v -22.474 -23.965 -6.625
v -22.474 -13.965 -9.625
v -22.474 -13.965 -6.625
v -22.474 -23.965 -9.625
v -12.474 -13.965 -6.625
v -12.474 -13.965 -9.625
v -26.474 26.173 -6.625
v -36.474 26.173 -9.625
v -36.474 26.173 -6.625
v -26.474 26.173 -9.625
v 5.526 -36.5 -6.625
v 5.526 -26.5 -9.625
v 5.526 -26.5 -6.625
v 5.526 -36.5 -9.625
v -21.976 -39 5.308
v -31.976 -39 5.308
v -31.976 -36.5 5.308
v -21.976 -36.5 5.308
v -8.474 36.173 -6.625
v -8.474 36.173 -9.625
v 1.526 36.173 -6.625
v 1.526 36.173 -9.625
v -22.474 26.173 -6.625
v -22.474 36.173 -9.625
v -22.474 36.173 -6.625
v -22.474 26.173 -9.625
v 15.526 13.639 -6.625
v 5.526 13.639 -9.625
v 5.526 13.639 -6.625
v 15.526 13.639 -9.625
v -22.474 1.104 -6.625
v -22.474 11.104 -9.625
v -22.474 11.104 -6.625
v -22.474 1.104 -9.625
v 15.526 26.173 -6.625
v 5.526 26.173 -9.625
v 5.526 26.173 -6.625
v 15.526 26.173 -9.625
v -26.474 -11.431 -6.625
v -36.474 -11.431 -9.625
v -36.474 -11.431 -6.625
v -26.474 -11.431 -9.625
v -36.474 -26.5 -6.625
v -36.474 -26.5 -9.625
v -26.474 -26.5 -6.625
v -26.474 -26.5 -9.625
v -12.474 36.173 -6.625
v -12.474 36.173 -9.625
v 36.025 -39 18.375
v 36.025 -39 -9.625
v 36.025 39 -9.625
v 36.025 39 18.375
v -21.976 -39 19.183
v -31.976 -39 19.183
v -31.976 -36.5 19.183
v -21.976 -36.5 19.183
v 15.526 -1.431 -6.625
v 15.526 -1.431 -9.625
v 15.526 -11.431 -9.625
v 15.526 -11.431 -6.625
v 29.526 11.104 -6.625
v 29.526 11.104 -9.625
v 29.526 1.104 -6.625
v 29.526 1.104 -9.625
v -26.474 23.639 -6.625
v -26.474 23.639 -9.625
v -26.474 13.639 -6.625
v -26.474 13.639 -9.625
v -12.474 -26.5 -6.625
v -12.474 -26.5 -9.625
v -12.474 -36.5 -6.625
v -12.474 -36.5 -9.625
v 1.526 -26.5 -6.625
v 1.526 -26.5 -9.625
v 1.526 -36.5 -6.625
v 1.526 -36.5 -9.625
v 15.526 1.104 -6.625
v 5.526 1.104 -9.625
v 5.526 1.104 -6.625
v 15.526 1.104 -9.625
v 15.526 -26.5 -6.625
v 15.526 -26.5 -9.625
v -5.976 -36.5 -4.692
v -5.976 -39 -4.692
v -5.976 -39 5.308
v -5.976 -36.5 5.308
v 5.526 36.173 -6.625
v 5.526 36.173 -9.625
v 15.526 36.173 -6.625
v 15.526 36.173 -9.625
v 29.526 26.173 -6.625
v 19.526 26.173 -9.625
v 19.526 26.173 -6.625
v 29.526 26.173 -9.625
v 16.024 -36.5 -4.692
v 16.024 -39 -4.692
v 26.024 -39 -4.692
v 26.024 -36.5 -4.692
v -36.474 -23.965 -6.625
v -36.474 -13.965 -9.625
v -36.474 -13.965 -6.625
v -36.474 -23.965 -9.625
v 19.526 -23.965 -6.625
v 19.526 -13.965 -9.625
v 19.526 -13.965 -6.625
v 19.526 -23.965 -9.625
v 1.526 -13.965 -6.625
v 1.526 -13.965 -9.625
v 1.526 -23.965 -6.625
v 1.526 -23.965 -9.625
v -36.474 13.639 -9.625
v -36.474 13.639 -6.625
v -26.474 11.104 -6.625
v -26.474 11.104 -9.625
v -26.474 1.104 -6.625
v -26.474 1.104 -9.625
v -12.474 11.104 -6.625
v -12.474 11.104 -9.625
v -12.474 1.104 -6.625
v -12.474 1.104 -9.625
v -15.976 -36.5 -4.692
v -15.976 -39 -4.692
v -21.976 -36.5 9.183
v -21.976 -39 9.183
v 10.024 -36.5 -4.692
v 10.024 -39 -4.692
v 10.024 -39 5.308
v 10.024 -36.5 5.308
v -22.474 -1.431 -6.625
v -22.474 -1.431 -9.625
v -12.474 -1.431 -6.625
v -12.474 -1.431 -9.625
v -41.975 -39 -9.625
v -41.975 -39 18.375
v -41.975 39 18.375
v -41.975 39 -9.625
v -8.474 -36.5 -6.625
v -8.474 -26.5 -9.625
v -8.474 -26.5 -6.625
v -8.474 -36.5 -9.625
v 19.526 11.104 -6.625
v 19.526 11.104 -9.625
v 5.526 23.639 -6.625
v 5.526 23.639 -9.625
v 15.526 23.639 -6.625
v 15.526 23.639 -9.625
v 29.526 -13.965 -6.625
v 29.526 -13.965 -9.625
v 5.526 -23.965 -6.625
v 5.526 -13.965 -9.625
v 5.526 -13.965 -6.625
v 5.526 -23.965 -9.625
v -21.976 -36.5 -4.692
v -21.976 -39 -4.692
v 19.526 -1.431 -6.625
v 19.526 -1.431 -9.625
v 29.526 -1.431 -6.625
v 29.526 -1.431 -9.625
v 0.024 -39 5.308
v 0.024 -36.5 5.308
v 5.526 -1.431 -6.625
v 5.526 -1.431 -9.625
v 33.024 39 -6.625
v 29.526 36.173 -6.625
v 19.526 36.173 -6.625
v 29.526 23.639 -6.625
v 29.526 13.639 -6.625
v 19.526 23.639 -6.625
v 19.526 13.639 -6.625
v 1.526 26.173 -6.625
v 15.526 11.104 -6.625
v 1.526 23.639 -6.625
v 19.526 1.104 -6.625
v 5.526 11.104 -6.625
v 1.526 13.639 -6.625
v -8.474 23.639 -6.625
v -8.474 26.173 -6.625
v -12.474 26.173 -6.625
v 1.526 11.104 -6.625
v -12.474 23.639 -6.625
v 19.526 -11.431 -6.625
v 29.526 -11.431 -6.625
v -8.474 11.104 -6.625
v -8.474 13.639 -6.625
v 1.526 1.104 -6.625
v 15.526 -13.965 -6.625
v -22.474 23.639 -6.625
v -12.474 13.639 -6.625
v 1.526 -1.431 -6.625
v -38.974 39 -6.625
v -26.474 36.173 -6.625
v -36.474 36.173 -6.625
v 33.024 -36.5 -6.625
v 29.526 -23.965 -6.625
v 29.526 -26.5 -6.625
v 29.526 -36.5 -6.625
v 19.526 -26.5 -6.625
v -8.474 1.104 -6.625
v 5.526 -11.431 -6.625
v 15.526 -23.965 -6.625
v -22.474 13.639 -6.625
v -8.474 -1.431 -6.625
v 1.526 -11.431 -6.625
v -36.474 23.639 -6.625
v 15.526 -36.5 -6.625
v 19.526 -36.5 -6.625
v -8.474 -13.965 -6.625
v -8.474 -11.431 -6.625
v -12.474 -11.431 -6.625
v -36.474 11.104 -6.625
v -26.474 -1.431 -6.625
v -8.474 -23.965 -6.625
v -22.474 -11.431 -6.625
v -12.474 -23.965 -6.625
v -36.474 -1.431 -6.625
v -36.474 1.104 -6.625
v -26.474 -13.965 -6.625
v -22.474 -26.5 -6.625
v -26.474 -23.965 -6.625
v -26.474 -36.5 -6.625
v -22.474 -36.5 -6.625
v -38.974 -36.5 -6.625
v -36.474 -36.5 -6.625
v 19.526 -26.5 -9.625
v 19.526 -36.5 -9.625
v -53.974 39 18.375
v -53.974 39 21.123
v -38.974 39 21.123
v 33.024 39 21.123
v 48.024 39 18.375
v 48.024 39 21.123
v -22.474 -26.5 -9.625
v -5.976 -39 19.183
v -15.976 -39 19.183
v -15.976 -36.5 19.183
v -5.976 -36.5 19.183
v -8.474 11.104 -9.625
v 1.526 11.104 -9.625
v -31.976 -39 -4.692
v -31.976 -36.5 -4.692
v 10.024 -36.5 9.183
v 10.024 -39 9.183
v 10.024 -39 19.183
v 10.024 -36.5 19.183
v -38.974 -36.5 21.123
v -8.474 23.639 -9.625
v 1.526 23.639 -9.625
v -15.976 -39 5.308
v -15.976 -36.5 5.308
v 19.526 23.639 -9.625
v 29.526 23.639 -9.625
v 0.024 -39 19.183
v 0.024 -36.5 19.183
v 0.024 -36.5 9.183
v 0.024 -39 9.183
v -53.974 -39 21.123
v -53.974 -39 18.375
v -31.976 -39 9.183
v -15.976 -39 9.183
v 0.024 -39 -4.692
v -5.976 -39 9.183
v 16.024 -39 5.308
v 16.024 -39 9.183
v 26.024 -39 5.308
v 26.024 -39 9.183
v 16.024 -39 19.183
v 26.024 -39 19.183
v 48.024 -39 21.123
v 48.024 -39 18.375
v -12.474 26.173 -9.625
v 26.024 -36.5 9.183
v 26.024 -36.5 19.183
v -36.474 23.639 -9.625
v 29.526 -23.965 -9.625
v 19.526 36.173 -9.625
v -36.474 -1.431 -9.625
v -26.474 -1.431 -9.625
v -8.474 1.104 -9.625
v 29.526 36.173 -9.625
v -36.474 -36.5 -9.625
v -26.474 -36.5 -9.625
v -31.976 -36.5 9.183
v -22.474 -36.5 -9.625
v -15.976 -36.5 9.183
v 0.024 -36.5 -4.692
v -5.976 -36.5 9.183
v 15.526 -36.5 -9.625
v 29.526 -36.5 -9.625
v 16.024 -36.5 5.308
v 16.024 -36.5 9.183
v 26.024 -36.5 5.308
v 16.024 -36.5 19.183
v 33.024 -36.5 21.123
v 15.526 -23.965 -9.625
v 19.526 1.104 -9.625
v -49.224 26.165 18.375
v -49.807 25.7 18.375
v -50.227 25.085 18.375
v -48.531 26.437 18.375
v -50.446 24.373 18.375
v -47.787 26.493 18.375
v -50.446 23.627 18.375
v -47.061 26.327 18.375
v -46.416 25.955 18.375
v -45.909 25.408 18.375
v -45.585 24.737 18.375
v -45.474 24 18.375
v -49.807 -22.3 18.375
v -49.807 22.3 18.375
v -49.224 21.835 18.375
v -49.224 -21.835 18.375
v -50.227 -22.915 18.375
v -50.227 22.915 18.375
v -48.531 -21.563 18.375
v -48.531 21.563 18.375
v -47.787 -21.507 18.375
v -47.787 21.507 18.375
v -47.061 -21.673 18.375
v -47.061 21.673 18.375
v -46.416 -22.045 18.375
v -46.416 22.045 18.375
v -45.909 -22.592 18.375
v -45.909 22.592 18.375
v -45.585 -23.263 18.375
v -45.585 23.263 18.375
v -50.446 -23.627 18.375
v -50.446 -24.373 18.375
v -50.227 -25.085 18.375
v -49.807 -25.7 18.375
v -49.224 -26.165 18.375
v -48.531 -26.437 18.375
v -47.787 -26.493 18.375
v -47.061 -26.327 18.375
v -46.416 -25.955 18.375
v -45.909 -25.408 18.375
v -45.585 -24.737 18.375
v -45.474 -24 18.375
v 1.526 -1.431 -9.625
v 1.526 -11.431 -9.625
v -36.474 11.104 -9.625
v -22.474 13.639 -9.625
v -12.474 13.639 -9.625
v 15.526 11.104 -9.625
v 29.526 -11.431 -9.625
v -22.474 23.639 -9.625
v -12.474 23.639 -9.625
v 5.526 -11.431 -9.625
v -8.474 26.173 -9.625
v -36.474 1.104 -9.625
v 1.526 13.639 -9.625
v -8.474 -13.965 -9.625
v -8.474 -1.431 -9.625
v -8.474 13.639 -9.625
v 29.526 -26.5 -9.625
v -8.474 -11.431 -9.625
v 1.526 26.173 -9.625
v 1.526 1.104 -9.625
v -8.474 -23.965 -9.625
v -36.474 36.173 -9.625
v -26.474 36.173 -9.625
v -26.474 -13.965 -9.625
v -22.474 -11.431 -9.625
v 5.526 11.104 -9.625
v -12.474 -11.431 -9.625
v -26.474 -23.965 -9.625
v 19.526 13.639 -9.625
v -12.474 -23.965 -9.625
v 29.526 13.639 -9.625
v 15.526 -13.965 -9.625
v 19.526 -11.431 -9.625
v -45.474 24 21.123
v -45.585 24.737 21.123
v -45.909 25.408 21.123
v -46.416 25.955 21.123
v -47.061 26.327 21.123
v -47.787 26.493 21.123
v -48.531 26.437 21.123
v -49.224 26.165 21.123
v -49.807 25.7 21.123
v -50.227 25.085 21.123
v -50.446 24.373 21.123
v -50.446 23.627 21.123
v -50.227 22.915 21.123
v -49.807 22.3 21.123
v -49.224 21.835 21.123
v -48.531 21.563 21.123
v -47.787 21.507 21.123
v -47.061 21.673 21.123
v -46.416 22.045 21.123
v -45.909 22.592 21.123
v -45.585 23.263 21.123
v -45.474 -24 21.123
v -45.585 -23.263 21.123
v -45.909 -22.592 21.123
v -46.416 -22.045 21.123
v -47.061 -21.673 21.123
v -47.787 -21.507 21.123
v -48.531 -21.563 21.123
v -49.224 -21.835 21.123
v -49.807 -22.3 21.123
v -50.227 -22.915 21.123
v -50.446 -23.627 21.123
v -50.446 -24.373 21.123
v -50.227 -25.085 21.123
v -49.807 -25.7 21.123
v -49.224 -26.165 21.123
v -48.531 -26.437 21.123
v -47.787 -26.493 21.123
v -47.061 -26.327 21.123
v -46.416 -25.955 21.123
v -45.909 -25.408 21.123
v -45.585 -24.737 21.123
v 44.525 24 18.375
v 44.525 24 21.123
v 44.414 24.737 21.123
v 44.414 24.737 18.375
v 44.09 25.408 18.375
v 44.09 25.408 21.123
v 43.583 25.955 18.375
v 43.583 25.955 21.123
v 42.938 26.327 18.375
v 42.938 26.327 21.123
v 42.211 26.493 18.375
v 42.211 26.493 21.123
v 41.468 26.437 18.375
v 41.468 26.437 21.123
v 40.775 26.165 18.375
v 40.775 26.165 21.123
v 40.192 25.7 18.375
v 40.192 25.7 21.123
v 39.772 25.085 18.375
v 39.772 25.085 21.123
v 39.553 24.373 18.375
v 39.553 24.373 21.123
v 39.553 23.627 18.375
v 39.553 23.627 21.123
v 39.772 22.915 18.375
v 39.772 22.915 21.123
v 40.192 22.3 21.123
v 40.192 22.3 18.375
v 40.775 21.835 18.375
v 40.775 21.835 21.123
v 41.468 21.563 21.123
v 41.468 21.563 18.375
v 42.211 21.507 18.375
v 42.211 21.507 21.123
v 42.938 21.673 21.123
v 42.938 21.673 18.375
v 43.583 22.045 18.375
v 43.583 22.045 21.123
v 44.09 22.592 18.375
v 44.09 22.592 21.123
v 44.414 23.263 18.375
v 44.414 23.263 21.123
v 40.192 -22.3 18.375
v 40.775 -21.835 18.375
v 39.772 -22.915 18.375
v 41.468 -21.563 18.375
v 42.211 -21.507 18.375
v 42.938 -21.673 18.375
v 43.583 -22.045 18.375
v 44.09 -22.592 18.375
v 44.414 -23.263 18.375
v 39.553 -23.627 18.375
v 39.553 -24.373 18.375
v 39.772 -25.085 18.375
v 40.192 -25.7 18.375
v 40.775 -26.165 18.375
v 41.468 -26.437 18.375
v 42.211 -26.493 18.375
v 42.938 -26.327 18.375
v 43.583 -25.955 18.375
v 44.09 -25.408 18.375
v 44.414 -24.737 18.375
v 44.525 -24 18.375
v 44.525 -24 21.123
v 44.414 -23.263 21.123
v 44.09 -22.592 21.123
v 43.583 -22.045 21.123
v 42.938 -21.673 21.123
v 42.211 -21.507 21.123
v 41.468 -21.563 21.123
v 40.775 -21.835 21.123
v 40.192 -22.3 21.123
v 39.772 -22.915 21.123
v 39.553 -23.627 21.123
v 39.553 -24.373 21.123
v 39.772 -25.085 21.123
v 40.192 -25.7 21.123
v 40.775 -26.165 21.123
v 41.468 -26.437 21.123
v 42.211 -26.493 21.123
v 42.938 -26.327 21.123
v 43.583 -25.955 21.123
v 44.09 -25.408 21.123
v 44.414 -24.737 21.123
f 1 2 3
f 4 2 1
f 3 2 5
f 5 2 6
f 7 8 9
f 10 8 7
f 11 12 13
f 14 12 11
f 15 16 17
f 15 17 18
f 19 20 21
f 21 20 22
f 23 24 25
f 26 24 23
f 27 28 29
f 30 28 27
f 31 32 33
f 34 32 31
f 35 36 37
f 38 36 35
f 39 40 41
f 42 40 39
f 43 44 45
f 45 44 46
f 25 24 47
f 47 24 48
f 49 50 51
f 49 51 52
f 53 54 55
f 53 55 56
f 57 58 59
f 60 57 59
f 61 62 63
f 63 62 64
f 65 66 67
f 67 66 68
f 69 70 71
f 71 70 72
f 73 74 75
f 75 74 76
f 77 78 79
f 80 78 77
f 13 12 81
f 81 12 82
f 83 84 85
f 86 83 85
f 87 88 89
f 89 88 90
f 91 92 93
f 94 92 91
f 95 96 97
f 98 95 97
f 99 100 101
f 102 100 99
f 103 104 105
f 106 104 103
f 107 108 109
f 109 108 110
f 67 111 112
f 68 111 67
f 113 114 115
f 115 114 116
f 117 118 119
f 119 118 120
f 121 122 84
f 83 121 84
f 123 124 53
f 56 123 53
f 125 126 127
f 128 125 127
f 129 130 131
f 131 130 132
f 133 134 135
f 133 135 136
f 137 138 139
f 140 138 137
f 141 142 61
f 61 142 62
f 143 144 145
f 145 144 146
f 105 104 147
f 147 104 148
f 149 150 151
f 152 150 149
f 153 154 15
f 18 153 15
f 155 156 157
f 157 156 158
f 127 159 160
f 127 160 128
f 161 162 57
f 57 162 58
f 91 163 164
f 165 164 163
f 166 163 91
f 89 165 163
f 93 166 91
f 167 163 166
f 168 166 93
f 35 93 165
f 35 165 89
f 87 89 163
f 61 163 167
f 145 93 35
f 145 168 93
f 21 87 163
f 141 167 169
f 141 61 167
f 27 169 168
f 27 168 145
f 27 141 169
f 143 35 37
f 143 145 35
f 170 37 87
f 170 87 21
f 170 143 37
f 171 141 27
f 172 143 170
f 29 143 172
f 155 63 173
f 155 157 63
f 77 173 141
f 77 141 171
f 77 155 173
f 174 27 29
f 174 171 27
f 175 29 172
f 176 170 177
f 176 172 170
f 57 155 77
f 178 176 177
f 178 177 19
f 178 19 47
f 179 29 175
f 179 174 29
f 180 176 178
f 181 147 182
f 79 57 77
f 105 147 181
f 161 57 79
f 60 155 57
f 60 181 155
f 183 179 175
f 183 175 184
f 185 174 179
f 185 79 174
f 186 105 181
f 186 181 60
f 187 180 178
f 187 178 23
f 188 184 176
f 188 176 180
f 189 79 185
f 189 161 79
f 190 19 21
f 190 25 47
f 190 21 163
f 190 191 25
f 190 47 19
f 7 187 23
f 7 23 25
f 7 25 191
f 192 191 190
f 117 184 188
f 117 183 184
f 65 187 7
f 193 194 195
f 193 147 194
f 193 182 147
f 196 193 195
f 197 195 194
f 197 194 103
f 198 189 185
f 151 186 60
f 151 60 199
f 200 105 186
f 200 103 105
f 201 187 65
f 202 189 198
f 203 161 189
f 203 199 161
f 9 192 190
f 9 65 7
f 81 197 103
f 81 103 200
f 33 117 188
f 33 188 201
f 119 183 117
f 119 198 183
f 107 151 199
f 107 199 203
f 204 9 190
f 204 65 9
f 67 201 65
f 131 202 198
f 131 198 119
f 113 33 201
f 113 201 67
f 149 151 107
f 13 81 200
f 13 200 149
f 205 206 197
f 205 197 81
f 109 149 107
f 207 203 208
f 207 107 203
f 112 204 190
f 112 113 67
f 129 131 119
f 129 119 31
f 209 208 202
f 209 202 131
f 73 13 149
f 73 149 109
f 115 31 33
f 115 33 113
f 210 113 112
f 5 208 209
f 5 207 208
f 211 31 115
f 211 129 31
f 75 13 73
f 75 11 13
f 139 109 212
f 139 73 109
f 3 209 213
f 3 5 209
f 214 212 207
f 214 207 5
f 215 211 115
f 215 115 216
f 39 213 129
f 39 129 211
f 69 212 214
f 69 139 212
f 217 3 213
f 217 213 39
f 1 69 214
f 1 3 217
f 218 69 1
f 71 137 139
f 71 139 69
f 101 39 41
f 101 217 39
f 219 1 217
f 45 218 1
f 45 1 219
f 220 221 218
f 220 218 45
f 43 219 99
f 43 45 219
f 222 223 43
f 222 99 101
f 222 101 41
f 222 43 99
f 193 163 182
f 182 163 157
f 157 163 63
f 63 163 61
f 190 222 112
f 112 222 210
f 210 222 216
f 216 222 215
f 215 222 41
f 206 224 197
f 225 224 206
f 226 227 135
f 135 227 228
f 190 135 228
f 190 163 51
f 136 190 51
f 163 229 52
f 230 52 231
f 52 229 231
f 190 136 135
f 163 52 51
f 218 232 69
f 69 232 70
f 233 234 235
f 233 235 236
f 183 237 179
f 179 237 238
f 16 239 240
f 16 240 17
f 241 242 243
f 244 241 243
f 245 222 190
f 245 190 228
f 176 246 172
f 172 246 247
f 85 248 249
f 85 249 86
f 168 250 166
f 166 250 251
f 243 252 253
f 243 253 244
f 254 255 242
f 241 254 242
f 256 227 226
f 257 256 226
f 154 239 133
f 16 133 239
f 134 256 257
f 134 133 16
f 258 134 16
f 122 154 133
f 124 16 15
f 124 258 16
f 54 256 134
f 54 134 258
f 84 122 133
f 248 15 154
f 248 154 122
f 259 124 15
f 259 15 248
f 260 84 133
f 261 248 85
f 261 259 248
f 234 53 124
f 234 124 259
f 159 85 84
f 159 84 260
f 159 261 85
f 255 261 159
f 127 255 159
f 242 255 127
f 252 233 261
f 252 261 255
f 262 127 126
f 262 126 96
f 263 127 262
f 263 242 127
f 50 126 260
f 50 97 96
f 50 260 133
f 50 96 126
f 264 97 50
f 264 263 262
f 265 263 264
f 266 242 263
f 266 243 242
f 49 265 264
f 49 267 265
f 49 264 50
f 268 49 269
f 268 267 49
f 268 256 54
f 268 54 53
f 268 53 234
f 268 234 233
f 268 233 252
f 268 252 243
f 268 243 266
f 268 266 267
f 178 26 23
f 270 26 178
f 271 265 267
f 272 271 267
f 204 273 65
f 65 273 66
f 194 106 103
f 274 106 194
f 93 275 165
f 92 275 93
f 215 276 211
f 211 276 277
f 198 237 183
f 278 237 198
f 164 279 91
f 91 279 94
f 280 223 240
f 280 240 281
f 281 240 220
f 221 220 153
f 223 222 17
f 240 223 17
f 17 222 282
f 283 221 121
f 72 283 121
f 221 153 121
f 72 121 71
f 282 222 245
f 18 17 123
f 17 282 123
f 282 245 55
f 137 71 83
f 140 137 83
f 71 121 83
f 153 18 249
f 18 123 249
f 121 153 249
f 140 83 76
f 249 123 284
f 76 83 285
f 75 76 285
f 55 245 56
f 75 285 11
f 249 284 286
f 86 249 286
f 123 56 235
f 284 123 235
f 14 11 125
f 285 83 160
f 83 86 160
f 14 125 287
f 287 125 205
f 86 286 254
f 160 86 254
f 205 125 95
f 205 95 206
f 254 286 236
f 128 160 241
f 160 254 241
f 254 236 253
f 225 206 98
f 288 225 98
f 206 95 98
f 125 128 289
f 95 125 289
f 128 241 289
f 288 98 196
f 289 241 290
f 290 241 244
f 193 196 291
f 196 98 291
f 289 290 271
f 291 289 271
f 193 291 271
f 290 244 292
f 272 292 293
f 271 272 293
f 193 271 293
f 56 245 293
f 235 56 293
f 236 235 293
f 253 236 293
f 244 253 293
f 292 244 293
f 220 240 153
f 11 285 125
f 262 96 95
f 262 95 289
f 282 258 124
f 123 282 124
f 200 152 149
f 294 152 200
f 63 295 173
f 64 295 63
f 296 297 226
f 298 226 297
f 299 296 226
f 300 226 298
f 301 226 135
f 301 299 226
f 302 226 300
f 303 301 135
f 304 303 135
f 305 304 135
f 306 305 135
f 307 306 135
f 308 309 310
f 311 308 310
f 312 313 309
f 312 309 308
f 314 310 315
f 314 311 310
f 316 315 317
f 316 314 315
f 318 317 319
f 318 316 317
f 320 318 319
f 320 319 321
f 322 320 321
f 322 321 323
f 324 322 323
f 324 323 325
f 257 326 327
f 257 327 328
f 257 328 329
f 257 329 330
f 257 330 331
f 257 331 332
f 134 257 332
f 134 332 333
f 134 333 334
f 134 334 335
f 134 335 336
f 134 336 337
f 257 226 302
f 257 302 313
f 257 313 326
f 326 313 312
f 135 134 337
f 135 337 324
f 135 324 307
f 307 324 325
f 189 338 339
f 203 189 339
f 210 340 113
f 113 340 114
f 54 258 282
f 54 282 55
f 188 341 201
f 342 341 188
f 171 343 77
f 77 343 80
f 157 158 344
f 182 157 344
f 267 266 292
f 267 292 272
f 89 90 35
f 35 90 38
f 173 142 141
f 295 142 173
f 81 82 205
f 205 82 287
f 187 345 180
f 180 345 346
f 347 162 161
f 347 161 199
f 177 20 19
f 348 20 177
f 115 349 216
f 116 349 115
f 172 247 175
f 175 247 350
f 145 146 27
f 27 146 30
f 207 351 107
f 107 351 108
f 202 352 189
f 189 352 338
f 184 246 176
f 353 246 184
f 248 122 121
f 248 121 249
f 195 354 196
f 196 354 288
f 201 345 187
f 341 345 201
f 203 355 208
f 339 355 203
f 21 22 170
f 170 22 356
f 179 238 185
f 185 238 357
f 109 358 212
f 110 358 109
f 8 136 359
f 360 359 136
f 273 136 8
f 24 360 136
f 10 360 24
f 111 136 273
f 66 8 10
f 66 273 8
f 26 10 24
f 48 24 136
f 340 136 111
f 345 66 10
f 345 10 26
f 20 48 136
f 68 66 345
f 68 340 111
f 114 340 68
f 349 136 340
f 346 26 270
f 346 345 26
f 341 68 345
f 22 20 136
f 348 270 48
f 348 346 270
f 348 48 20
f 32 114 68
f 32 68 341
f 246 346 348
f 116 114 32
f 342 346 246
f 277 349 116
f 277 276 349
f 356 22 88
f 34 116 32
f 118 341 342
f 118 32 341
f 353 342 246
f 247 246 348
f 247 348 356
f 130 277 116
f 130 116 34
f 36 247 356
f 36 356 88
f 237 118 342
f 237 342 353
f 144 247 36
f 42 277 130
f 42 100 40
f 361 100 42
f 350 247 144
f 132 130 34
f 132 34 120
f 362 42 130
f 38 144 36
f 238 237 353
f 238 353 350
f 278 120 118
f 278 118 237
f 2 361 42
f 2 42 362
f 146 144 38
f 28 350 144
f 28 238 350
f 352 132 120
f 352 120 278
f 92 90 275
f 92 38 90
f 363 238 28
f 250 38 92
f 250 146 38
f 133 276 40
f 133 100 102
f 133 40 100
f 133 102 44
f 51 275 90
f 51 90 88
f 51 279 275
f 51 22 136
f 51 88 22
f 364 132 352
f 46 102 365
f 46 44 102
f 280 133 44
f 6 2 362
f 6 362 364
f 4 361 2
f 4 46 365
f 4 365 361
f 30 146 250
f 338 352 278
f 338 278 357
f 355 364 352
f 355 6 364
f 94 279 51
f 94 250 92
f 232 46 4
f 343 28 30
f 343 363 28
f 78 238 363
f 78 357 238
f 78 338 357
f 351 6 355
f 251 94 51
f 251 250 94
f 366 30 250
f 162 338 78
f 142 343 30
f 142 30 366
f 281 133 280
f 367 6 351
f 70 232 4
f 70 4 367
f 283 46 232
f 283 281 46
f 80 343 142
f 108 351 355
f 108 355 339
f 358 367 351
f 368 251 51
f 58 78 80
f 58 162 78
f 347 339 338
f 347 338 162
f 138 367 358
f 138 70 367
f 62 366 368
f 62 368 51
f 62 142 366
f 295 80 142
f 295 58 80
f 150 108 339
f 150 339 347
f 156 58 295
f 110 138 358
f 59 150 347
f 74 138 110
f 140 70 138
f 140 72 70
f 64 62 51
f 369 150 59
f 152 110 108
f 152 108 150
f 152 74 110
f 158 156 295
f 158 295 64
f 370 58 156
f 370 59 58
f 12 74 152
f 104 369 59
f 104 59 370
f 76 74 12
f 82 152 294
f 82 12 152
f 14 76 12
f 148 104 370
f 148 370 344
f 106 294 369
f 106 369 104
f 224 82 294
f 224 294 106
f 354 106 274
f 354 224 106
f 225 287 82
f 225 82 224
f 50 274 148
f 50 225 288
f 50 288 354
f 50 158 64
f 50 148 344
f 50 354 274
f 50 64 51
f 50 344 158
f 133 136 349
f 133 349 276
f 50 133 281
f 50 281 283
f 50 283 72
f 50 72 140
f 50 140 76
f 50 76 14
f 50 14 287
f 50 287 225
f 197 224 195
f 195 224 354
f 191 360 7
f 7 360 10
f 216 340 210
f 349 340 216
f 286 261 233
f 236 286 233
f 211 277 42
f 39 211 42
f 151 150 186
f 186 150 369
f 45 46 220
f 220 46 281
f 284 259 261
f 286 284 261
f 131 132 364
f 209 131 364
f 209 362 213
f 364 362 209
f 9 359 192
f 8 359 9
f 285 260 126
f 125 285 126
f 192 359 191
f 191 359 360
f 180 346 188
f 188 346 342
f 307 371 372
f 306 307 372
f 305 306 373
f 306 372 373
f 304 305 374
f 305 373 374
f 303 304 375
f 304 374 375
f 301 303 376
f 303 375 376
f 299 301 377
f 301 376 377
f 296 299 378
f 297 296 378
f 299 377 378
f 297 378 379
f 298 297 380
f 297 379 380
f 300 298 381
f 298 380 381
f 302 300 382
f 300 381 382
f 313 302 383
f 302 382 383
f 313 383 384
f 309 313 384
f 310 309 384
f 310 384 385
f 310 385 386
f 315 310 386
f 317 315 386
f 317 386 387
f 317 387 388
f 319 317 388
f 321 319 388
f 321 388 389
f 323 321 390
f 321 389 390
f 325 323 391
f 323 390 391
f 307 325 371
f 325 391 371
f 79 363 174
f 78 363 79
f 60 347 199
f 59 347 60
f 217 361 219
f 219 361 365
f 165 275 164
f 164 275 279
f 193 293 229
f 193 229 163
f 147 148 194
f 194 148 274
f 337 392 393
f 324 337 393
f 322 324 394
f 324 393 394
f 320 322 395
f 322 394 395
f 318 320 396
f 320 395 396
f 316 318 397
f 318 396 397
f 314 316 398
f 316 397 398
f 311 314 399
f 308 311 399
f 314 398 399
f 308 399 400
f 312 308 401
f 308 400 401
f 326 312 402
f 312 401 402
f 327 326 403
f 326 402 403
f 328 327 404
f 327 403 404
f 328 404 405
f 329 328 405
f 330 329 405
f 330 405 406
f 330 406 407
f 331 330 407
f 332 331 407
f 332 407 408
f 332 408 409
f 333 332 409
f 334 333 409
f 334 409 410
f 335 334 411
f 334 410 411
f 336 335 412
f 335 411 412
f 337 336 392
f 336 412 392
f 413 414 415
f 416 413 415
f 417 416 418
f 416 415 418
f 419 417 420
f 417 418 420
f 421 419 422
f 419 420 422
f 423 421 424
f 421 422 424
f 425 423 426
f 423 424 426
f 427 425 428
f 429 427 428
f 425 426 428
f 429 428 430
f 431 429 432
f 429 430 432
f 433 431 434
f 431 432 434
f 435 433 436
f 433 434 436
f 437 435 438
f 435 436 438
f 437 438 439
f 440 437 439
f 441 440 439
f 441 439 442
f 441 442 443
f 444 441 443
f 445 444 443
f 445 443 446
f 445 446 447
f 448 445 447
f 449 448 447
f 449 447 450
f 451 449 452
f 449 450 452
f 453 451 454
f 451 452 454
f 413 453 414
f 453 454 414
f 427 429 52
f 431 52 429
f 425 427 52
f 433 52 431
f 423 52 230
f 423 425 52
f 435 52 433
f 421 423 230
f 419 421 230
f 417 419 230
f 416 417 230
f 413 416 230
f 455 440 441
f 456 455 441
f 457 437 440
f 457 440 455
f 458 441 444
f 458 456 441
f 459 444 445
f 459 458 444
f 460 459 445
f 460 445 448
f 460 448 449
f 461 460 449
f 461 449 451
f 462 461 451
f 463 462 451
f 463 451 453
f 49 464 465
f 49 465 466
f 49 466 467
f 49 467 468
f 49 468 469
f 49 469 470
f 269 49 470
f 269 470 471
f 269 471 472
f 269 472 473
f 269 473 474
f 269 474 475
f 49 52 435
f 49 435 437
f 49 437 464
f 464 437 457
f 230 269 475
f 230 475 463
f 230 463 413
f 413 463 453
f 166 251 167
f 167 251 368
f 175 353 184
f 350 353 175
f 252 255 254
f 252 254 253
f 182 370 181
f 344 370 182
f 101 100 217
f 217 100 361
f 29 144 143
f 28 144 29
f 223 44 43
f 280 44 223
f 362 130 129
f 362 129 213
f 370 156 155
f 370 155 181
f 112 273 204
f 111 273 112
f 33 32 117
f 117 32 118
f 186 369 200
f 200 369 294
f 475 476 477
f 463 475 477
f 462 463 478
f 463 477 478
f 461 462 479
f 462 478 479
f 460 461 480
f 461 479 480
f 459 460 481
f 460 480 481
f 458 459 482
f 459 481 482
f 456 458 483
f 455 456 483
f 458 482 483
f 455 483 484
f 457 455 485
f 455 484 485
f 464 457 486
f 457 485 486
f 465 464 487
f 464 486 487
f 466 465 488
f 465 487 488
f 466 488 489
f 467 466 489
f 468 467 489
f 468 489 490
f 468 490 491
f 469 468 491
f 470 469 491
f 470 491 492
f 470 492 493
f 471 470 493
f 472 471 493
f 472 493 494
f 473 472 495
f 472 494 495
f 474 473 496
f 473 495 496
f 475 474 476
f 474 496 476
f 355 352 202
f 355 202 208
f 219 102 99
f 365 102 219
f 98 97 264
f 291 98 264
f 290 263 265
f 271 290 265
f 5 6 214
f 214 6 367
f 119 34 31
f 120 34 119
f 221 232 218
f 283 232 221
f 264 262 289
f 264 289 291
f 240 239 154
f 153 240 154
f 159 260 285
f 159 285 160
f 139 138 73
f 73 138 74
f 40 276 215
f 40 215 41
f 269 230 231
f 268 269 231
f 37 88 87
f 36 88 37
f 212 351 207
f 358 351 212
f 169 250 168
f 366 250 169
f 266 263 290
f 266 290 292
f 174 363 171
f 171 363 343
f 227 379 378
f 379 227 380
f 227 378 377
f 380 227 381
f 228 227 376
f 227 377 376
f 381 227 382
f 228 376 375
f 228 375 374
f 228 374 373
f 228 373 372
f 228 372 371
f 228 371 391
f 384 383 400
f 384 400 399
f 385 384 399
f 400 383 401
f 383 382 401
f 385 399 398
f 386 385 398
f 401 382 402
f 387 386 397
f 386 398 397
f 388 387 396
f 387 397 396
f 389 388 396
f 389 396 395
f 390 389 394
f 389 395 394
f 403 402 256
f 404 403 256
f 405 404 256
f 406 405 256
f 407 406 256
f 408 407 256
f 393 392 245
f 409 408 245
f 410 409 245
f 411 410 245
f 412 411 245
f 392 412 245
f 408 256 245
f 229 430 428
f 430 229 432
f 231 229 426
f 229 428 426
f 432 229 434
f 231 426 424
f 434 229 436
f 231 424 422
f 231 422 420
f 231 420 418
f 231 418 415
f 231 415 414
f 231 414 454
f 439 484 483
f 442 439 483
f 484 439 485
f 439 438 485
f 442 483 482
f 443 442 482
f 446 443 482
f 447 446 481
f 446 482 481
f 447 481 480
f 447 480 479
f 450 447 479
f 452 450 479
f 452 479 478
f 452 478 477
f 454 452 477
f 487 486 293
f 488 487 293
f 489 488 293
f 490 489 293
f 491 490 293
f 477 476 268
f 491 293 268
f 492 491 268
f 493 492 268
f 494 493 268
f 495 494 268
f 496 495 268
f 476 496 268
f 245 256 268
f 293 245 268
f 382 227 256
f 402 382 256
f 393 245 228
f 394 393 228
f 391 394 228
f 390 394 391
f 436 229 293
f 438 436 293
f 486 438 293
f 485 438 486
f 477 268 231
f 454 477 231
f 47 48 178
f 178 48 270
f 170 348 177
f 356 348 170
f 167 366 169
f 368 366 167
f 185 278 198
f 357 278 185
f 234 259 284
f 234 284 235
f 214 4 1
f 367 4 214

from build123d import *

# Parameters (mm, degrees)
F1_DEPTH = 39
F2_R     = 2.5
F3_DEPTH = 2.748386896
F4_W     = 10
F4_H     = 10
F5_DEPTH = 3
F6_W     = 71.9977971367
F6_H     = 27.748386896
F7_DEPTH = 2.5
F8_W     = 10
F8_H     = 10
F9_DEPTH = 2.5


with BuildPart() as f1:
    # F0 (on Front) → F1 (new body, symmetric)
    with BuildSketch(Plane.XZ):
        Polygon((33.0240737289, -6.6249261405), (-2.9748248395, -6.6249261405), (-2.9748248395, -9.6249261405), (36.0251751605, -9.6249261405), (36.0251751605, 18.3750738595), (48.0240737289, 18.3750738595), (48.0240737289, 21.1234607555), (33.0240737289, 21.1234607555), align=None)
        Polygon((-2.9748248395, -9.6249261405), (-2.9748248395, -6.6249261405), (-38.9737234078, -6.6249261405), (-38.9737234078, 21.1234607555), (-53.9737234078, 21.1234607555), (-53.9737234078, 18.3750738595), (-41.9748248395, 18.3750738595), (-41.9748248395, -9.6249261405), align=None)
    extrude(amount=F1_DEPTH, both=True)

    # F2 (on face) → F3 (cut, through all)
    with BuildSketch(Plane.XY.offset(21.1234607555)):
        with Locations((42.0246244447, -24)):
            Circle(F2_R)
        with Locations((42.0246244447, 24)):
            Circle(F2_R)
        with Locations((-47.9742741236, 24)):
            Circle(F2_R)
        with Locations((-47.9742741236, -24)):
            Circle(F2_R)
    extrude(amount=-F3_DEPTH, mode=Mode.SUBTRACT)

    # F4 (on face) → F5 (cut, through all)
    with BuildSketch(Plane(origin=(0, 0, -9.6249261405), x_dir=(1, 0, 0), z_dir=(0, 0, -1))):
        with Locations((-31.4737234078, 31.5)):
            Rectangle(F4_W, F4_H)
        with Locations((-17.4737234078, 31.5)):
            Rectangle(F4_W, F4_H)
        with Locations((-3.4737234078, 31.5)):
            Rectangle(F4_W, F4_H)
        with Locations((10.5262765922, 31.5)):
            Rectangle(F4_W, F4_H)
        with Locations((24.5262765922, 31.5)):
            Rectangle(F4_W, F4_H)
        with Locations((10.5262765922, 18.9653515071)):
            Rectangle(F4_W, F4_H)
        with Locations((24.5262765922, 18.9653515071)):
            Rectangle(F4_W, F4_H)
        with Locations((-31.4737234078, 18.9653515071)):
            Rectangle(F4_W, F4_H)
        with Locations((-17.4737234078, 18.9653515071)):
            Rectangle(F4_W, F4_H)
        with Locations((-3.4737234078, 18.9653515071)):
            Rectangle(F4_W, F4_H)
        with Locations((10.5262765922, 6.4307030141)):
            Rectangle(F4_W, F4_H)
        with Locations((24.5262765922, 6.4307030141)):
            Rectangle(F4_W, F4_H)
        with Locations((-31.4737234078, 6.4307030141)):
            Rectangle(F4_W, F4_H)
        with Locations((-17.4737234078, 6.4307030141)):
            Rectangle(F4_W, F4_H)
        with Locations((-3.4737234078, 6.4307030141)):
            Rectangle(F4_W, F4_H)
        with Locations((10.5262765922, -6.1039454788)):
            Rectangle(F4_W, F4_H)
        with Locations((24.5262765922, -6.1039454788)):
            Rectangle(F4_W, F4_H)
        with Locations((-31.4737234078, -6.1039454788)):
            Rectangle(F4_W, F4_H)
        with Locations((-17.4737234078, -6.1039454788)):
            Rectangle(F4_W, F4_H)
        with Locations((-3.4737234078, -6.1039454788)):
            Rectangle(F4_W, F4_H)
        with Locations((10.5262765922, -18.6385939717)):
            Rectangle(F4_W, F4_H)
        with Locations((24.5262765922, -18.6385939717)):
            Rectangle(F4_W, F4_H)
        with Locations((-31.4737234078, -18.6385939717)):
            Rectangle(F4_W, F4_H)
        with Locations((-17.4737234078, -18.6385939717)):
            Rectangle(F4_W, F4_H)
        with Locations((-3.4737234078, -18.6385939717)):
            Rectangle(F4_W, F4_H)
        with Locations((10.5262765922, -31.1732424647)):
            Rectangle(F4_W, F4_H)
        with Locations((24.5262765922, -31.1732424647)):
            Rectangle(F4_W, F4_H)
        with Locations((-31.4737234078, -31.1732424647)):
            Rectangle(F4_W, F4_H)
        with Locations((-17.4737234078, -31.1732424647)):
            Rectangle(F4_W, F4_H)
        with Locations((-3.4737234078, -31.1732424647)):
            Rectangle(F4_W, F4_H)
    extrude(amount=-F5_DEPTH, mode=Mode.SUBTRACT)

    # F6 (on face) → F7 (join)
    with BuildSketch(Plane.XZ.offset(39)):
        with Locations((-2.9748248395, 7.2492673075)):
            Rectangle(F6_W, F6_H)
    extrude(amount=-F7_DEPTH)

    # F8 (on face) → F9 (cut, through all)
    with BuildSketch(Plane.XZ.offset(39)):
        with Locations((-26.9759262711, 14.1834607555)):
            Rectangle(F8_W, F8_H)
        with Locations((-10.9759262711, 14.1834607555)):
            Rectangle(F8_W, F8_H)
        with Locations((5.0240737289, 14.1834607555)):
            Rectangle(F8_W, F8_H)
        with Locations((21.0240737289, 14.1834607555)):
            Rectangle(F8_W, F8_H)
        with Locations((21.0240737289, 0.3084607555)):
            Rectangle(F8_W, F8_H)
        with Locations((-26.9759262711, 0.3084607555)):
            Rectangle(F8_W, F8_H)
        with Locations((-10.9759262711, 0.3084607555)):
            Rectangle(F8_W, F8_H)
        with Locations((5.0240737289, 0.3084607555)):
            Rectangle(F8_W, F8_H)
    extrude(amount=-F9_DEPTH, mode=Mode.SUBTRACT)


solid = f1.part
